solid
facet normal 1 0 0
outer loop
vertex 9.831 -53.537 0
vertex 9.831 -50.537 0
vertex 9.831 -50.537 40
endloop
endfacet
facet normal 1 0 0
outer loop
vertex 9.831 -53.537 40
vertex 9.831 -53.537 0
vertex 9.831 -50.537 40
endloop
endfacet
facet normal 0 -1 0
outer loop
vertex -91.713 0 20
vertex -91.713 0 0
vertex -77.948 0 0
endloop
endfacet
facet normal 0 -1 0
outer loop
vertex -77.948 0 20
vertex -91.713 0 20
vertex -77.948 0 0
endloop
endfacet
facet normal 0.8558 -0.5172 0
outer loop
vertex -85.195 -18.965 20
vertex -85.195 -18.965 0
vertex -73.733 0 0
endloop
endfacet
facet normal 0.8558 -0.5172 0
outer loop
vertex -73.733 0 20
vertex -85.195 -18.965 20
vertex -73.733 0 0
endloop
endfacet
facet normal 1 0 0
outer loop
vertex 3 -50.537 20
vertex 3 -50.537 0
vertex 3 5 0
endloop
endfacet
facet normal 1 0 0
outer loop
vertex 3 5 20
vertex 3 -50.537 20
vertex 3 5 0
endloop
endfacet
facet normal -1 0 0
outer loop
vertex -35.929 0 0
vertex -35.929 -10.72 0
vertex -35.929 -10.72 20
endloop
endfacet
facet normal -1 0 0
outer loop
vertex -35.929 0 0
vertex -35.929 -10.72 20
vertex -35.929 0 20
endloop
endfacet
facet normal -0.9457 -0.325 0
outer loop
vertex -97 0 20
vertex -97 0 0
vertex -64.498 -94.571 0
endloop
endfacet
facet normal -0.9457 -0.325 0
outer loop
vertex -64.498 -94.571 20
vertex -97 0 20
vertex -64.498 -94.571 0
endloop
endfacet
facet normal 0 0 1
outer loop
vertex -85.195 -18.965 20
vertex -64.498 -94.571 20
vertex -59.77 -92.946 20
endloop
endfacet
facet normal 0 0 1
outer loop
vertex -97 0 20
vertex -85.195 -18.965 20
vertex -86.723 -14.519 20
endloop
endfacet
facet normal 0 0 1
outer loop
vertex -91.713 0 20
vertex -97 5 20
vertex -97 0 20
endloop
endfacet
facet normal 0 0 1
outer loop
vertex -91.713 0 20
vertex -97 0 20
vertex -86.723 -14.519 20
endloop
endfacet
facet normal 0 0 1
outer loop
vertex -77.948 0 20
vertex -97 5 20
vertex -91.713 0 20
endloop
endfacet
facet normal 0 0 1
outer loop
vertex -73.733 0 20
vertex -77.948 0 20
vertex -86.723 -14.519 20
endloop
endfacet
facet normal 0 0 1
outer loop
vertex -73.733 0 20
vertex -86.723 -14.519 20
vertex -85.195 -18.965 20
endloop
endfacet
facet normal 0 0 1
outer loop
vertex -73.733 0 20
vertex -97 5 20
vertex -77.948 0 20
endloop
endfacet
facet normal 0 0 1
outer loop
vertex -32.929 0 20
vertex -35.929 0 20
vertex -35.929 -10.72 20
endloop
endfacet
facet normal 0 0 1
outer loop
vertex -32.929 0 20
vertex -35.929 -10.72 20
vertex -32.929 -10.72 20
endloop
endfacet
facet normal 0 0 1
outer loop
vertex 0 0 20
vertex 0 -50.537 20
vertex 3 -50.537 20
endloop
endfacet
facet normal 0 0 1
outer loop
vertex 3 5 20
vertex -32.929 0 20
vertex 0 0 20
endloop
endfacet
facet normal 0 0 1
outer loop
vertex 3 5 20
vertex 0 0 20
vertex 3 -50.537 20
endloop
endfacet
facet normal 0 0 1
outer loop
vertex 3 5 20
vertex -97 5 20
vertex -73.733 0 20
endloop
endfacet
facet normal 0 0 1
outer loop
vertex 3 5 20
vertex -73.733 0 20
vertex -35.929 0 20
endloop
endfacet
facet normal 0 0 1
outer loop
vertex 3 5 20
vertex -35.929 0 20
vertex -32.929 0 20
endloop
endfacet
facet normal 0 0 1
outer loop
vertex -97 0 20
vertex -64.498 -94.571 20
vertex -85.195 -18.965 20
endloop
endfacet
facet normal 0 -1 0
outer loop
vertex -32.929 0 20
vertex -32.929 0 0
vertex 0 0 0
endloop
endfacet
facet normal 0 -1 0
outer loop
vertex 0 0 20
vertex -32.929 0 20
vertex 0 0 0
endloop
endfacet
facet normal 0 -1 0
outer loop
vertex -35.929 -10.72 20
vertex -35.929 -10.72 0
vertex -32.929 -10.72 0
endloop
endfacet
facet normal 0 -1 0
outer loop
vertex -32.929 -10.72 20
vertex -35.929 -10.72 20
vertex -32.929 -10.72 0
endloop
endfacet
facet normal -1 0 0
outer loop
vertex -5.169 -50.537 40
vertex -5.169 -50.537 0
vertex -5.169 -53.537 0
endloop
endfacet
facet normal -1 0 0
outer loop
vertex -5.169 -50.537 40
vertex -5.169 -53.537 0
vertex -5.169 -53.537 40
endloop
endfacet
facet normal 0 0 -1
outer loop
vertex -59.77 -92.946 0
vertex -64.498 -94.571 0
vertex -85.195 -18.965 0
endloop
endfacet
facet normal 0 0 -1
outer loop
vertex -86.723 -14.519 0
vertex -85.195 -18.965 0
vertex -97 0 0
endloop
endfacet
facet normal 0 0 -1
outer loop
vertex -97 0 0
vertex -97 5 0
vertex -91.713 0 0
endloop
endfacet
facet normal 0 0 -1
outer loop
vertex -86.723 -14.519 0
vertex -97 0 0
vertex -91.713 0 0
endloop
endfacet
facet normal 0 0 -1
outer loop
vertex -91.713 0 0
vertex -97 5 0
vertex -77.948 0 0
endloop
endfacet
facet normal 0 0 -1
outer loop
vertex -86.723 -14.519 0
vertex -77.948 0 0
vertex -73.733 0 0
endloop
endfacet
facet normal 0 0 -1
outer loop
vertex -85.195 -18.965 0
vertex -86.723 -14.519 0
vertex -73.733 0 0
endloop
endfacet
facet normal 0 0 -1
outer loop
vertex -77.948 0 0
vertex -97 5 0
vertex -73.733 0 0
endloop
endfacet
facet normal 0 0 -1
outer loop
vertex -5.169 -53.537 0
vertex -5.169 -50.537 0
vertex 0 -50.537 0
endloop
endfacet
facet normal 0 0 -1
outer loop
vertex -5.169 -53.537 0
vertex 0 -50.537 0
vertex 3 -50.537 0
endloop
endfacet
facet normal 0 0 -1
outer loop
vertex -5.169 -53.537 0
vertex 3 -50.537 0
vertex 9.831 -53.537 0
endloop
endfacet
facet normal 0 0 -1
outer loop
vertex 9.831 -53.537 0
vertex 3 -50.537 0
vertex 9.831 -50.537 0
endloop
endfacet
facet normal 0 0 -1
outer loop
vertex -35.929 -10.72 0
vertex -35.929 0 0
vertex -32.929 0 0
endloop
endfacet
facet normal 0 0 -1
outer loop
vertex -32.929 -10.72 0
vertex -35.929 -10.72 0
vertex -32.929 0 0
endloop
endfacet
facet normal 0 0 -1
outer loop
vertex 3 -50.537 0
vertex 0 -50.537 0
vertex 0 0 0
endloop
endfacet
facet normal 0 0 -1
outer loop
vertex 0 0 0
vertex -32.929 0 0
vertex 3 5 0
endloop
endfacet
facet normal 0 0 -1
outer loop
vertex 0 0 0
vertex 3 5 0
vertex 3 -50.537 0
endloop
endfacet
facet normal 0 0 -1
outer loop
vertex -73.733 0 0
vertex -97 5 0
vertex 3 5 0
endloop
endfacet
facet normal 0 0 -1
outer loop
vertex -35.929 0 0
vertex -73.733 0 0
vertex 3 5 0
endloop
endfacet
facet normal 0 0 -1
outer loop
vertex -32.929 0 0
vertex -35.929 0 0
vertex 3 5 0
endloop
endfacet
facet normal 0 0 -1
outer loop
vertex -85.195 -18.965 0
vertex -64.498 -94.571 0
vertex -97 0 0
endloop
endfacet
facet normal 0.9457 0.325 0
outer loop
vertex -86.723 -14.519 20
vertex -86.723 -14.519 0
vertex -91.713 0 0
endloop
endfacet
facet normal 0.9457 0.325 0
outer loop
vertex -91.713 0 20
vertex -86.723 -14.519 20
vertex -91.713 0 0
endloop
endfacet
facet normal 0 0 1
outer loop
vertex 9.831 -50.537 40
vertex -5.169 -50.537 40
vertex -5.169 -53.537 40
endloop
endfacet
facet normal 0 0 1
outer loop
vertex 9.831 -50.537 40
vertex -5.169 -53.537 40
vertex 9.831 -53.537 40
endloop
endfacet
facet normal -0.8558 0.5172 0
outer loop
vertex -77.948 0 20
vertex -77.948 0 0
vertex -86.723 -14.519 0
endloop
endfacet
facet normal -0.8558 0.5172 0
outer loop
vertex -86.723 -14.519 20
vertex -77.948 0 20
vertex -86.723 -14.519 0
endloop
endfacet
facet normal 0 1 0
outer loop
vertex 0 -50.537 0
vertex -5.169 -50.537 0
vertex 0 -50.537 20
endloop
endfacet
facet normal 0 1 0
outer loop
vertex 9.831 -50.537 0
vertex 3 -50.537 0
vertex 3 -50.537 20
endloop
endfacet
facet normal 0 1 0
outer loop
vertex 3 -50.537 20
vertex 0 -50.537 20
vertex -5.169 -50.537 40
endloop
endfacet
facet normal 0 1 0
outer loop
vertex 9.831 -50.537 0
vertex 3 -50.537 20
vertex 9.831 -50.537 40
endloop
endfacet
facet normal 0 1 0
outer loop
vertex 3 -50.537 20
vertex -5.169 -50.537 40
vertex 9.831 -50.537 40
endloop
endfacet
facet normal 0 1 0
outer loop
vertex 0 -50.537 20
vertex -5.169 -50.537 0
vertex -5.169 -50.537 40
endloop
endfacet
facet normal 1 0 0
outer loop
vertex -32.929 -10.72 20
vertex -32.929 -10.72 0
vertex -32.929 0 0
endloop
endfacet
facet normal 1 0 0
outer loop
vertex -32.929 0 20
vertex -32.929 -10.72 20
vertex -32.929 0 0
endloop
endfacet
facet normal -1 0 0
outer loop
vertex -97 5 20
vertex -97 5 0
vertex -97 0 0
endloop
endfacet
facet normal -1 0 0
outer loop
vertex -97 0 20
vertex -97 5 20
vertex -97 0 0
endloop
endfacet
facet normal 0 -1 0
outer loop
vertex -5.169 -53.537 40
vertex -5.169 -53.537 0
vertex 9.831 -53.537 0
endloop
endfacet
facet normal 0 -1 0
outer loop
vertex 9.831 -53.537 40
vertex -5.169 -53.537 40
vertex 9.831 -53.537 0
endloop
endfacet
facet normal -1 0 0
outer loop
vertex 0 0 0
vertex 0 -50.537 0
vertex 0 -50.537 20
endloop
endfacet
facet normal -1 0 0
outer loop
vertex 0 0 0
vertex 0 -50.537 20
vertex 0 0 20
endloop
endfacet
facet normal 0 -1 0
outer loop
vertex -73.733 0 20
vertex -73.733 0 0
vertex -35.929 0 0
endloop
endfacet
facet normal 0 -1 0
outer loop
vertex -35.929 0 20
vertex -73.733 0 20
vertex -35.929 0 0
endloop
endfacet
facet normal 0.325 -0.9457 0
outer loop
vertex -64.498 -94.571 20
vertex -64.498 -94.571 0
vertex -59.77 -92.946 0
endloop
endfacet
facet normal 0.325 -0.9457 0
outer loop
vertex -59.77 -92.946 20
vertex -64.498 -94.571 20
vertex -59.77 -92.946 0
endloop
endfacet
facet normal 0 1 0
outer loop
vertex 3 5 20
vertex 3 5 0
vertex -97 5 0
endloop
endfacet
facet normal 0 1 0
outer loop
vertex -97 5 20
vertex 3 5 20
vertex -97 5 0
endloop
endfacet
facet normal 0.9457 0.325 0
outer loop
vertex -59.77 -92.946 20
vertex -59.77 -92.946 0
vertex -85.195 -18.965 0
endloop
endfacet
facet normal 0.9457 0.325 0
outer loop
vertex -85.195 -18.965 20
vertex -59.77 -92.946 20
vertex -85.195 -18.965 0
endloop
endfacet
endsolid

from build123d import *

# Parameters (mm, degrees)
F0_W     = 3
F0_H     = 50.536646
F0_H_2   = 10.719895
F1_DEPTH = 20
F2_W     = 15
F2_H     = 40
F3_DEPTH = 3


with BuildPart() as f1:
    # F0 (on Top) → F1 (new body)
    with BuildSketch(Plane.XY):
        Polygon((-32.92932, 0), (0, 0), (3, 0), (3, 5), (-97, 5), (-97, 0), (-91.712957, 0), (-77.947989, 0), (-73.732667, 0), (-35.92932, 0), align=None)
        with Locations((1.5, -25.268323)):
            Rectangle(F0_W, F0_H)
        with Locations((-34.42932, -5.359947)):
            Rectangle(F0_W, F0_H_2)
        Polygon((-85.19516, -18.964979), (-73.732667, 0), (-77.947989, 0), (-86.723201, -14.518805), align=None)
        Polygon((-91.712957, 0), (-97, 0), (-64.49833, -94.570828), (-59.769789, -92.945744), (-85.19516, -18.964979), (-86.723201, -14.518805), align=None)
    extrude(amount=F1_DEPTH)

    # F2 (on face) → F3 (join)
    with BuildSketch(Plane.XZ.offset(50.536646)):
        with Locations((2.331055, 20)):
            Rectangle(F2_W, F2_H)
    extrude(amount=F3_DEPTH)


solid = f1.part
